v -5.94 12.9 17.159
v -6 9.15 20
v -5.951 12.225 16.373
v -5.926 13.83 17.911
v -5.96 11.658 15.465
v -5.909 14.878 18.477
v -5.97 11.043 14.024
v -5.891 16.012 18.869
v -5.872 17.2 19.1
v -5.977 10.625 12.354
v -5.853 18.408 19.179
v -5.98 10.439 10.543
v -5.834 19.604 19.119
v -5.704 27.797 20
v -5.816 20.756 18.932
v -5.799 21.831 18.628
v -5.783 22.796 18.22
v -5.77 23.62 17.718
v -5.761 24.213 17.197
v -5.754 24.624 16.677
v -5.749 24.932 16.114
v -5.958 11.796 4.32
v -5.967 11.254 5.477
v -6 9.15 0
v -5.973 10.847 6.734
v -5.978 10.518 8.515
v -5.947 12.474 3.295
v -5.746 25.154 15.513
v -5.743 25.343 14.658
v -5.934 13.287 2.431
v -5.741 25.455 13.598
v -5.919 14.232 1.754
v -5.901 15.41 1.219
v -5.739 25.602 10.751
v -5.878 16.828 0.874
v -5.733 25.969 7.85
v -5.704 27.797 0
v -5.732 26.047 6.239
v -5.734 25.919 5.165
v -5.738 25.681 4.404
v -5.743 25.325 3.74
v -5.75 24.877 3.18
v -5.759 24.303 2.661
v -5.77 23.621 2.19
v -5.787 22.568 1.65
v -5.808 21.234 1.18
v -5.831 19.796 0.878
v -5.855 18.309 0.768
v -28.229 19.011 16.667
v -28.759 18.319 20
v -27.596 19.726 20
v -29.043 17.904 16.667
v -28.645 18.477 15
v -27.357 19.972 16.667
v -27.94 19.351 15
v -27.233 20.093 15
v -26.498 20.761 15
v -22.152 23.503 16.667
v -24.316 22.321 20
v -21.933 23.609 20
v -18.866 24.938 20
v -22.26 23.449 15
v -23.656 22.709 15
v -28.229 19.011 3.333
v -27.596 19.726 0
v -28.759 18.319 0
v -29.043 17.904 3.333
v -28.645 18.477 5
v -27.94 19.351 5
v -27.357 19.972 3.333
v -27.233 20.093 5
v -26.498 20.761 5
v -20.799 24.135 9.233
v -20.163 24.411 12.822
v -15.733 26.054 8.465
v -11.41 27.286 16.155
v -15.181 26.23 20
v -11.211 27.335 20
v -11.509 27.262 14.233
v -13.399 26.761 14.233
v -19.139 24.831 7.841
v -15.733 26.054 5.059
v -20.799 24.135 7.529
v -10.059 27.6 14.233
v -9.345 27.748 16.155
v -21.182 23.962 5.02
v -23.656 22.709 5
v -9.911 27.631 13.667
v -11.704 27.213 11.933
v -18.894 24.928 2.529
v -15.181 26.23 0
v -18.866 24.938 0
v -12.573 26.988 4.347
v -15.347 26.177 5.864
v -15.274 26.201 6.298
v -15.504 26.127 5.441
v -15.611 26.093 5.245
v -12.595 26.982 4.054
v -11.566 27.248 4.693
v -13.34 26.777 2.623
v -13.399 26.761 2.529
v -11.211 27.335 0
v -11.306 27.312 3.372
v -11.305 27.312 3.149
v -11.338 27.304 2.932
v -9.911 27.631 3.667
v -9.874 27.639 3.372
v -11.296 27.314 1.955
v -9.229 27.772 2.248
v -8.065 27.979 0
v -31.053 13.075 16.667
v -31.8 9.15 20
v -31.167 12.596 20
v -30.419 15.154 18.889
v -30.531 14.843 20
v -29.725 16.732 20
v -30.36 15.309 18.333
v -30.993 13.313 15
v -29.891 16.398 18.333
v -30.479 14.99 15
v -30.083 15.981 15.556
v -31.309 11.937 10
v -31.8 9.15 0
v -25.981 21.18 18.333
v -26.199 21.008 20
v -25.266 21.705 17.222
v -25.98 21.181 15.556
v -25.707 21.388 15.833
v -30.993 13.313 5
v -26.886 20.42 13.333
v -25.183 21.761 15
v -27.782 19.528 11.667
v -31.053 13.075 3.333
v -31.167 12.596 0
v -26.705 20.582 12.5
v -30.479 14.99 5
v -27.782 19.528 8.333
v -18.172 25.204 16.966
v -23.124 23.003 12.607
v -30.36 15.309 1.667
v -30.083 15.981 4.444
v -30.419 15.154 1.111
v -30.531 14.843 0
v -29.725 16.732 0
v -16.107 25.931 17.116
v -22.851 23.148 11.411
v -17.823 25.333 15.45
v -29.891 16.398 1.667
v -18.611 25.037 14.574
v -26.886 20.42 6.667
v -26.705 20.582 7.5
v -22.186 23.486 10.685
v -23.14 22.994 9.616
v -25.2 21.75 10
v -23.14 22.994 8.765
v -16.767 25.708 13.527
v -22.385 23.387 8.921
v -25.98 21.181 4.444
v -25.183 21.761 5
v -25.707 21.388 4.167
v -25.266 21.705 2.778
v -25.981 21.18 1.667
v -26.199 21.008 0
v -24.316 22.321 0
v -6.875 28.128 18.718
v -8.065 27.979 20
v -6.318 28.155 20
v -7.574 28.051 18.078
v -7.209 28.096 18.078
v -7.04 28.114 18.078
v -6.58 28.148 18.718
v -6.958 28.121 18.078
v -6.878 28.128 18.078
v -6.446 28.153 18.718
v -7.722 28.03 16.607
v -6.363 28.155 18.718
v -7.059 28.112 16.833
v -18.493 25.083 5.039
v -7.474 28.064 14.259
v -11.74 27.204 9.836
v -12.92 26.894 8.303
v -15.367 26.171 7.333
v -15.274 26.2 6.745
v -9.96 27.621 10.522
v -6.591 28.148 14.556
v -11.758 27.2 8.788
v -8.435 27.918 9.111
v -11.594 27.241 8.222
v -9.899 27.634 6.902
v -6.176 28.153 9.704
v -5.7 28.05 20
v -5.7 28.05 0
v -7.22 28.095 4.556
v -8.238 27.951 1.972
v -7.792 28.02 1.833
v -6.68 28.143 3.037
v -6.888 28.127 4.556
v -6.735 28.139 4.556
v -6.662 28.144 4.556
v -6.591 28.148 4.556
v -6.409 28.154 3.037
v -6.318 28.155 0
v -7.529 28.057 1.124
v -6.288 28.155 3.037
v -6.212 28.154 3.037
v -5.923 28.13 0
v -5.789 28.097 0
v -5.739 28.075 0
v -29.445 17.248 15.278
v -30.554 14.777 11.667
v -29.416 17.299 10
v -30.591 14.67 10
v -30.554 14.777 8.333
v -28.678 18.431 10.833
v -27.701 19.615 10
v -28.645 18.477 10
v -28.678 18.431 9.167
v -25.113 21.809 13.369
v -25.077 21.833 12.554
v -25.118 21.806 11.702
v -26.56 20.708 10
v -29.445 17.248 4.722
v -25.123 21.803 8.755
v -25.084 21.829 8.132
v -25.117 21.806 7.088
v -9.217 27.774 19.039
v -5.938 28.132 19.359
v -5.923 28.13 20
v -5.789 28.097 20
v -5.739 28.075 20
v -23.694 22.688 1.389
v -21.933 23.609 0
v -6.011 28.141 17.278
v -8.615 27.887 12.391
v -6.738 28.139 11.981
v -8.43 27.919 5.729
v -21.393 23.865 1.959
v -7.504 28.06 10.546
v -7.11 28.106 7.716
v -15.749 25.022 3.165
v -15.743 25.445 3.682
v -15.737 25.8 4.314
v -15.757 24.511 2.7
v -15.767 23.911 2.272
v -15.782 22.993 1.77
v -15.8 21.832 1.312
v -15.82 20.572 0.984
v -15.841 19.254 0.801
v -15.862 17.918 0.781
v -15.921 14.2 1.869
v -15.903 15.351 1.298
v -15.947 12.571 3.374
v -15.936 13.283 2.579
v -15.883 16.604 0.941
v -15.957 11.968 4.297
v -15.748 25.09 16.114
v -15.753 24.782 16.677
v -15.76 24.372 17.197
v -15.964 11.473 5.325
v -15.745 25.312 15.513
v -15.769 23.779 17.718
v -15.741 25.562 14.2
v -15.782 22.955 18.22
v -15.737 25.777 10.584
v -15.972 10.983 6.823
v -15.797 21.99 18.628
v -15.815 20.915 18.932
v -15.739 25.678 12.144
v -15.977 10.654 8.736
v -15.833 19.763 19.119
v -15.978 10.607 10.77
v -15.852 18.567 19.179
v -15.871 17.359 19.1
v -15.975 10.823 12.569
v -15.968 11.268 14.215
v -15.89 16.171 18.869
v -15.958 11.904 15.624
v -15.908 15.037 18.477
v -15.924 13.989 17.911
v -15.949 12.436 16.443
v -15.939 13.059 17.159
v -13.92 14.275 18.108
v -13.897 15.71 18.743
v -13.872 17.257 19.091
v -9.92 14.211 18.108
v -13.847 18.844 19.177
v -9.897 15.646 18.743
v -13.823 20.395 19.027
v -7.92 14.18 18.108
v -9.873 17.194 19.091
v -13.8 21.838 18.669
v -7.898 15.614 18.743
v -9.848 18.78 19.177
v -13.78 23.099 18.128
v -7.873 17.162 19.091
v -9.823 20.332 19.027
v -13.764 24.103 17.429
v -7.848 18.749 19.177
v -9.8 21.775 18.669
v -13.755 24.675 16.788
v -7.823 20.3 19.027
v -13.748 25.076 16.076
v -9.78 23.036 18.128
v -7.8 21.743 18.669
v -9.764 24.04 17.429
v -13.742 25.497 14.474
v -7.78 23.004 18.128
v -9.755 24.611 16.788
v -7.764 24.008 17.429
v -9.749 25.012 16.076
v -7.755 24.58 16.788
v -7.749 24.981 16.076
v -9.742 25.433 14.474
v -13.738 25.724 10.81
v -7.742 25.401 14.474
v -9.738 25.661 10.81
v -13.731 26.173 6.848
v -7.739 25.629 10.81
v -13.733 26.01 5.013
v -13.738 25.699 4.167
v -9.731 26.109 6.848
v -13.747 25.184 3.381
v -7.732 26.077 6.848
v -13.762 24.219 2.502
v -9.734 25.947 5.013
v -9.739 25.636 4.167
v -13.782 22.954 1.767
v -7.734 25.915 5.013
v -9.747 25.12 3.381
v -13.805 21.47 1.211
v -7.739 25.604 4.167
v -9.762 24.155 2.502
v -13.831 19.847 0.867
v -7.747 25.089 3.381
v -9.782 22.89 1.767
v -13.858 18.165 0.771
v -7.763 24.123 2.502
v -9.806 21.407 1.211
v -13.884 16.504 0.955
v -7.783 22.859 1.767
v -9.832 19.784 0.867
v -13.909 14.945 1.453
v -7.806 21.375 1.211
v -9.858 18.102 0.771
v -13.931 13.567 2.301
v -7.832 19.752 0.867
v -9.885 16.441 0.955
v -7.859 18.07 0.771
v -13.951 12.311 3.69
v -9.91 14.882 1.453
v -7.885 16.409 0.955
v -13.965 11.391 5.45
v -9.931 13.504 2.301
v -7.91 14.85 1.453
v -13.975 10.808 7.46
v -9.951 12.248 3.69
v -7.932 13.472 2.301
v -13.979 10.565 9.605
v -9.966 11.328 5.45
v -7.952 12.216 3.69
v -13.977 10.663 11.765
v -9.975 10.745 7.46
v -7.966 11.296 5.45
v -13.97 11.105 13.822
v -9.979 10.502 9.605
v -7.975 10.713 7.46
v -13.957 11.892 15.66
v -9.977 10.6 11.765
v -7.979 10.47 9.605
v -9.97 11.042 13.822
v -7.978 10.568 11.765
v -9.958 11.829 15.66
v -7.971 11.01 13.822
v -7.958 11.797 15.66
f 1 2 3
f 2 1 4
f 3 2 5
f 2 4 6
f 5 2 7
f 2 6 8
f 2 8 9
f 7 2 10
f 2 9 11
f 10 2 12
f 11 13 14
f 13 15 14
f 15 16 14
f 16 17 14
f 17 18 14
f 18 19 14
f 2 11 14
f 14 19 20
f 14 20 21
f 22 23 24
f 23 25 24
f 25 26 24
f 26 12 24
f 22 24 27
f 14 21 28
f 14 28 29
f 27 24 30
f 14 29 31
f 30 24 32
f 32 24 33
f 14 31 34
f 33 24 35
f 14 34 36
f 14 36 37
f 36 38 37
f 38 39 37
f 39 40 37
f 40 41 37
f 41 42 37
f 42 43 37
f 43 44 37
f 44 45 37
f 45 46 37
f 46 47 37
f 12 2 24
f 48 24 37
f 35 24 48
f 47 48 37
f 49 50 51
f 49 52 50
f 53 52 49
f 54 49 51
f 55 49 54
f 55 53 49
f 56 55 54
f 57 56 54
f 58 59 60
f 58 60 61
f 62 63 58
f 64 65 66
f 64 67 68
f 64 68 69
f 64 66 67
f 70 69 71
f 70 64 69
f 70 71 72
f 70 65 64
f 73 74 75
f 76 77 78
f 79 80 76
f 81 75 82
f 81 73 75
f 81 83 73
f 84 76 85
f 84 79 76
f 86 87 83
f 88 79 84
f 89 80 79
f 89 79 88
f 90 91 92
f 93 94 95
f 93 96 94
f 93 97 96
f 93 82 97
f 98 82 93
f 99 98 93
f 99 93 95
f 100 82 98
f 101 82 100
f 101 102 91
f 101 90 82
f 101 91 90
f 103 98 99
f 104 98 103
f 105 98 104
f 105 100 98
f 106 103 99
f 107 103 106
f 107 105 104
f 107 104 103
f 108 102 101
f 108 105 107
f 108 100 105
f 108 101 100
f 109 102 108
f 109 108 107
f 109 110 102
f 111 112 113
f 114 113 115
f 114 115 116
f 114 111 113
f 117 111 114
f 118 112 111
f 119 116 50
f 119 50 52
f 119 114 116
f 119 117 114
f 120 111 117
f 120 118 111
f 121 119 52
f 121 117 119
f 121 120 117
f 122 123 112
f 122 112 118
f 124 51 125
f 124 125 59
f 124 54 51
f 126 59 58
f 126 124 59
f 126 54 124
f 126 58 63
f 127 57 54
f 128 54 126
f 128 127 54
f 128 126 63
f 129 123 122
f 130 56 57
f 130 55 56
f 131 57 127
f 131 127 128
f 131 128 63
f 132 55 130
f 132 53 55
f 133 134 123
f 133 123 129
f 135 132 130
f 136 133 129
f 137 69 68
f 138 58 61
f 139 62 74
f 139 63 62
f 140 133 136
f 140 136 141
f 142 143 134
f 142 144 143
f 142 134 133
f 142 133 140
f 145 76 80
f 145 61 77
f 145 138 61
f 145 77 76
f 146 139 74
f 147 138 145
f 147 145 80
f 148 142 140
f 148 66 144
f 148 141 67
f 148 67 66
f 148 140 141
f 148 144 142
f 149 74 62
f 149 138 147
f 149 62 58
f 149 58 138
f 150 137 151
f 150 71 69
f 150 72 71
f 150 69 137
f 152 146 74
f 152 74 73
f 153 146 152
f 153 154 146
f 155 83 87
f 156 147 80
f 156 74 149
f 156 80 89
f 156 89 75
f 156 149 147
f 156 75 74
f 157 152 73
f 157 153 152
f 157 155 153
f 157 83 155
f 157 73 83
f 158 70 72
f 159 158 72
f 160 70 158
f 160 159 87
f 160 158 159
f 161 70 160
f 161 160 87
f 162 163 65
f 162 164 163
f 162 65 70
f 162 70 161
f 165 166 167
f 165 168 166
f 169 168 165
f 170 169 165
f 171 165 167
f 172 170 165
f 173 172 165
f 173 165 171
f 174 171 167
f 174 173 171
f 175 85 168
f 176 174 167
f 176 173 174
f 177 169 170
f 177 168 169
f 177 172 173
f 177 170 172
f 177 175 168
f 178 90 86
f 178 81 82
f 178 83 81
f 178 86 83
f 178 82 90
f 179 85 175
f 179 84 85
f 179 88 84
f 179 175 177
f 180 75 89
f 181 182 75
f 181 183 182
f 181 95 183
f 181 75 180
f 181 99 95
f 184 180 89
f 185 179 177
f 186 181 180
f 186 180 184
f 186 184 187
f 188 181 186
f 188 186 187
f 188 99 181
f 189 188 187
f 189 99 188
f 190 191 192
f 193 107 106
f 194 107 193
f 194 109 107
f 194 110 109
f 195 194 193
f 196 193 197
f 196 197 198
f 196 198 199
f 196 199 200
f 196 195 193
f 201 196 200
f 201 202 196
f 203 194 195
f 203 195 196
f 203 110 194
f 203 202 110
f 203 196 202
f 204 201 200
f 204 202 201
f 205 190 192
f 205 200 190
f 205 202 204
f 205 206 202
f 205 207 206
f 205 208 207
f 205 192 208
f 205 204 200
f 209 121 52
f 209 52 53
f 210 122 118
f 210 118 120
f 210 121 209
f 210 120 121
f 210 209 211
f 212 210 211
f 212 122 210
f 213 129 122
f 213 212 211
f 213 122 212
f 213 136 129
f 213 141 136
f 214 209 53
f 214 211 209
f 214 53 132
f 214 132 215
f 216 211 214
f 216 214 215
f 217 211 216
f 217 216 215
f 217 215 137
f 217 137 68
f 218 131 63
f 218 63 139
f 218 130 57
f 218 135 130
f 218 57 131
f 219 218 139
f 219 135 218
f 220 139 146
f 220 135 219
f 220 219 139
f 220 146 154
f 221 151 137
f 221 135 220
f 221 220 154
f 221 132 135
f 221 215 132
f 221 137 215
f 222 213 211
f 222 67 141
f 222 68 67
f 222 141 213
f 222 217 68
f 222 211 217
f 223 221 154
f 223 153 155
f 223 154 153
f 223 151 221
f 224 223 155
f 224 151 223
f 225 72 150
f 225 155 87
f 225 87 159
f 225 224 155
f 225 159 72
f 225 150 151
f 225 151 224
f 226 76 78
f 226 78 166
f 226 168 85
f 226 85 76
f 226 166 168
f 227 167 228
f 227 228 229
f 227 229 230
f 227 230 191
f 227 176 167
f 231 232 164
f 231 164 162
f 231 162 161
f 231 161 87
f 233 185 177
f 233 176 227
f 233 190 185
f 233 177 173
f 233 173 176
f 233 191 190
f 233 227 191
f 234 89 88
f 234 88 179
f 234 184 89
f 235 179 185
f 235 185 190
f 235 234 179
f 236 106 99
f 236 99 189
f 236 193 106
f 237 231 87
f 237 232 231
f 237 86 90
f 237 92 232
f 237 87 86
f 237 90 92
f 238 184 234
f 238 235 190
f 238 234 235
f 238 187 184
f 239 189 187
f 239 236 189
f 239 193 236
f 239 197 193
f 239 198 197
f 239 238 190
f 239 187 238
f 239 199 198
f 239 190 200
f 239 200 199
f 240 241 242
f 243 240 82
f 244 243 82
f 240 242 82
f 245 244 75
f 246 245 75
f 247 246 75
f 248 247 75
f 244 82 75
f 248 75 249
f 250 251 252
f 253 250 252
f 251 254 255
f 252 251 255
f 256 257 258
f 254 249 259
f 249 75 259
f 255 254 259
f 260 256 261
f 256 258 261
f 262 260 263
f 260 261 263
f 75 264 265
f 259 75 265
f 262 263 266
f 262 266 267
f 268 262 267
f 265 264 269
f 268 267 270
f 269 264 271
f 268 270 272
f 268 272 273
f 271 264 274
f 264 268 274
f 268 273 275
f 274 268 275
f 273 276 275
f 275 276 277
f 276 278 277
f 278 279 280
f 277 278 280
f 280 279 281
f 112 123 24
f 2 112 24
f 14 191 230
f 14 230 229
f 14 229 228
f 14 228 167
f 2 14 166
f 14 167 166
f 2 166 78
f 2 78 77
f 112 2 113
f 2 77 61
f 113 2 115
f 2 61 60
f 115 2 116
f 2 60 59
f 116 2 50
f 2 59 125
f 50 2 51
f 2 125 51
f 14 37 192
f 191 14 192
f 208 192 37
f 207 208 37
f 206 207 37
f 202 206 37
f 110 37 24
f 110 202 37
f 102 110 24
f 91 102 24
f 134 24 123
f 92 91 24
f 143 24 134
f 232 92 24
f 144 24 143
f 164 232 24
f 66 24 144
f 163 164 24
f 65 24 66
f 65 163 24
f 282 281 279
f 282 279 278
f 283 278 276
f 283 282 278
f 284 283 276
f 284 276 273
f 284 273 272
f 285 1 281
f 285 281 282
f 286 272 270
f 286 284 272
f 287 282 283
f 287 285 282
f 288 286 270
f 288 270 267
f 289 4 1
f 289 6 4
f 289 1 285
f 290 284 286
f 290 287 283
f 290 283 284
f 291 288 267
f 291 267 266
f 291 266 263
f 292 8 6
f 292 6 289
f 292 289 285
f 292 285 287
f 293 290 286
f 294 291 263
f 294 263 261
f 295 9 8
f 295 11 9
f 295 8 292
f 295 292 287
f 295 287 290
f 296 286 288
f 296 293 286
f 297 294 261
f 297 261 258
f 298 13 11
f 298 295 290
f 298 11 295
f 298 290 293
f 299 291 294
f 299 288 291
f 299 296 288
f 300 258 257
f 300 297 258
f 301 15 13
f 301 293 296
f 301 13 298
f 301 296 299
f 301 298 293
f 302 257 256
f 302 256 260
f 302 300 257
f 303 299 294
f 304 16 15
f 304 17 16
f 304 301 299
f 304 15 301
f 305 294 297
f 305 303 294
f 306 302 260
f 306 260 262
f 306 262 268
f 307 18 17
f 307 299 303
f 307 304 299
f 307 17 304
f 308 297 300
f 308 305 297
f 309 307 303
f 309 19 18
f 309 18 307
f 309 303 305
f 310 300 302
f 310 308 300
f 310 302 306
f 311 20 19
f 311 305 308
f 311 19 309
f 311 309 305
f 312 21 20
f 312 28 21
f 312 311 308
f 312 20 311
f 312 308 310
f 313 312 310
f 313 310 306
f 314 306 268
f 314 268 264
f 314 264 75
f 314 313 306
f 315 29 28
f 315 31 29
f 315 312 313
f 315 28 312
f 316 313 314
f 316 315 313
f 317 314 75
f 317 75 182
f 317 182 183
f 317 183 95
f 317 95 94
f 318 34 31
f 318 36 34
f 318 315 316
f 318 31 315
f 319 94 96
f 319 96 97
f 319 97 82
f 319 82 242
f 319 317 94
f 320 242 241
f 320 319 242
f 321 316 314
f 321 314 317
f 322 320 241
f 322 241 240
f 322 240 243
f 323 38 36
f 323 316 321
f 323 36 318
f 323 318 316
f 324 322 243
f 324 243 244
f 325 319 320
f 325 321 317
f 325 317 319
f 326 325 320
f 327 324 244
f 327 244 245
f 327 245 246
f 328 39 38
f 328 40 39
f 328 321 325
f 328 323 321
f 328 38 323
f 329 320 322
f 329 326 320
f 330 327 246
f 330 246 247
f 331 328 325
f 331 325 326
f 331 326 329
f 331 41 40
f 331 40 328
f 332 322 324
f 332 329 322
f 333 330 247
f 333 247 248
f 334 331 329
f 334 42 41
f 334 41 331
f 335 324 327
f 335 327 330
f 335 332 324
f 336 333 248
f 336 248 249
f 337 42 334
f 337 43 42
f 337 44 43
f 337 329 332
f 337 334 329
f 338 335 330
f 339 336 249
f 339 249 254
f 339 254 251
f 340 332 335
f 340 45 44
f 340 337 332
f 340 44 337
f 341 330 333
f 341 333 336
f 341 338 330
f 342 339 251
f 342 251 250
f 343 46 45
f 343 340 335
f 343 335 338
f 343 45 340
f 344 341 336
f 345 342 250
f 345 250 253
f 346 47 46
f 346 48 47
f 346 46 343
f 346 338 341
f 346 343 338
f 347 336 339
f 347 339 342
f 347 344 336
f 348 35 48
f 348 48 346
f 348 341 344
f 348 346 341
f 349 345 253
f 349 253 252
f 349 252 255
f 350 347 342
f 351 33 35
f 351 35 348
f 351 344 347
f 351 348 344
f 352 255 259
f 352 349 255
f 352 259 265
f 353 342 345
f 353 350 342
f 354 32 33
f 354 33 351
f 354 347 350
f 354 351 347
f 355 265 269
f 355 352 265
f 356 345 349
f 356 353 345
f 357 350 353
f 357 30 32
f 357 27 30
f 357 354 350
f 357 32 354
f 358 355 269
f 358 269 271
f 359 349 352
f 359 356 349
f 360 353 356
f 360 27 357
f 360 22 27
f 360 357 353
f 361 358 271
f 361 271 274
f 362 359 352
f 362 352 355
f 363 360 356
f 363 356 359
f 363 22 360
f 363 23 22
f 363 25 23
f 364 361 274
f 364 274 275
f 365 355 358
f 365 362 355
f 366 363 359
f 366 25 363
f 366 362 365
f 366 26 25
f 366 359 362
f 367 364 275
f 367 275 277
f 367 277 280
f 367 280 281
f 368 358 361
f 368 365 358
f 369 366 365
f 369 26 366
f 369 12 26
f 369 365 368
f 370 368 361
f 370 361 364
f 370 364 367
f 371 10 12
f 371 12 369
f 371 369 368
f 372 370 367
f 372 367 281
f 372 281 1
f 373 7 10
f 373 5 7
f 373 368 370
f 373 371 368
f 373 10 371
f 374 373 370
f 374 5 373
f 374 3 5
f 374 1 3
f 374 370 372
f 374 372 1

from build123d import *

# Parameters (mm, degrees)
F1_DEPTH = 20
F3_DEPTH = 10


with BuildPart() as f1:
    # F0 (on Top) → F1 (new body)
    with BuildSketch(Plane.XY):
        with BuildLine():
            add(Edge.make_bspline(
                [(-31.8000018597, 9.1500002891), (-31.0652071062, 13.6890567824), (-29.4484436774, 23.6763090125), (-6.5512415539, 28.7391560968), (-5.7000000961, 28.0500017107)],
                knots=[0, 0, 0, 0, 0.4136574007, 0.910167301, 0.910167301, 0.910167301, 0.910167301], degree=3))
            Line((-31.8000018597, 9.1500002891), (-6.0000000522, 9.1500002891))
            Line((-6.0000000522, 9.1500002891), (-5.7040104388, 27.7973500647))
            Line((-5.7040104388, 27.7973500647), (-5.7000000961, 28.0500017107))
        make_face()
    extrude(amount=F1_DEPTH)

    # F2 (on face) → F3 (cut)
    with BuildSketch(Plane(origin=(-6.1436902015, 0.0975188705, 0), x_dir=(0.0158710131, 0.9998740475, 0), z_dir=(0.9998740475, -0.0158710131, 0))):
        with BuildLine():
            add(Edge.make_bspline(
                [(12.8039661795, 17.1590913087), (15.8180471512, 20.1309769332), (26.1538102441, 18.9645296951), (24.8740330547, 10.784341605), (27.7750213725, 1.9319473459), (9.7600574137, -1.9499761699), (9.3125957908, 13.7165980363), (12.8039661795, 17.1590913087)],
                knots=[0, 0, 0, 0, 0.208829576, 0.372592896, 0.5438100889, 0.7581015889, 1, 1, 1, 1], degree=3))
        make_face()
    extrude(amount=-F3_DEPTH, mode=Mode.SUBTRACT)


solid = f1.part
